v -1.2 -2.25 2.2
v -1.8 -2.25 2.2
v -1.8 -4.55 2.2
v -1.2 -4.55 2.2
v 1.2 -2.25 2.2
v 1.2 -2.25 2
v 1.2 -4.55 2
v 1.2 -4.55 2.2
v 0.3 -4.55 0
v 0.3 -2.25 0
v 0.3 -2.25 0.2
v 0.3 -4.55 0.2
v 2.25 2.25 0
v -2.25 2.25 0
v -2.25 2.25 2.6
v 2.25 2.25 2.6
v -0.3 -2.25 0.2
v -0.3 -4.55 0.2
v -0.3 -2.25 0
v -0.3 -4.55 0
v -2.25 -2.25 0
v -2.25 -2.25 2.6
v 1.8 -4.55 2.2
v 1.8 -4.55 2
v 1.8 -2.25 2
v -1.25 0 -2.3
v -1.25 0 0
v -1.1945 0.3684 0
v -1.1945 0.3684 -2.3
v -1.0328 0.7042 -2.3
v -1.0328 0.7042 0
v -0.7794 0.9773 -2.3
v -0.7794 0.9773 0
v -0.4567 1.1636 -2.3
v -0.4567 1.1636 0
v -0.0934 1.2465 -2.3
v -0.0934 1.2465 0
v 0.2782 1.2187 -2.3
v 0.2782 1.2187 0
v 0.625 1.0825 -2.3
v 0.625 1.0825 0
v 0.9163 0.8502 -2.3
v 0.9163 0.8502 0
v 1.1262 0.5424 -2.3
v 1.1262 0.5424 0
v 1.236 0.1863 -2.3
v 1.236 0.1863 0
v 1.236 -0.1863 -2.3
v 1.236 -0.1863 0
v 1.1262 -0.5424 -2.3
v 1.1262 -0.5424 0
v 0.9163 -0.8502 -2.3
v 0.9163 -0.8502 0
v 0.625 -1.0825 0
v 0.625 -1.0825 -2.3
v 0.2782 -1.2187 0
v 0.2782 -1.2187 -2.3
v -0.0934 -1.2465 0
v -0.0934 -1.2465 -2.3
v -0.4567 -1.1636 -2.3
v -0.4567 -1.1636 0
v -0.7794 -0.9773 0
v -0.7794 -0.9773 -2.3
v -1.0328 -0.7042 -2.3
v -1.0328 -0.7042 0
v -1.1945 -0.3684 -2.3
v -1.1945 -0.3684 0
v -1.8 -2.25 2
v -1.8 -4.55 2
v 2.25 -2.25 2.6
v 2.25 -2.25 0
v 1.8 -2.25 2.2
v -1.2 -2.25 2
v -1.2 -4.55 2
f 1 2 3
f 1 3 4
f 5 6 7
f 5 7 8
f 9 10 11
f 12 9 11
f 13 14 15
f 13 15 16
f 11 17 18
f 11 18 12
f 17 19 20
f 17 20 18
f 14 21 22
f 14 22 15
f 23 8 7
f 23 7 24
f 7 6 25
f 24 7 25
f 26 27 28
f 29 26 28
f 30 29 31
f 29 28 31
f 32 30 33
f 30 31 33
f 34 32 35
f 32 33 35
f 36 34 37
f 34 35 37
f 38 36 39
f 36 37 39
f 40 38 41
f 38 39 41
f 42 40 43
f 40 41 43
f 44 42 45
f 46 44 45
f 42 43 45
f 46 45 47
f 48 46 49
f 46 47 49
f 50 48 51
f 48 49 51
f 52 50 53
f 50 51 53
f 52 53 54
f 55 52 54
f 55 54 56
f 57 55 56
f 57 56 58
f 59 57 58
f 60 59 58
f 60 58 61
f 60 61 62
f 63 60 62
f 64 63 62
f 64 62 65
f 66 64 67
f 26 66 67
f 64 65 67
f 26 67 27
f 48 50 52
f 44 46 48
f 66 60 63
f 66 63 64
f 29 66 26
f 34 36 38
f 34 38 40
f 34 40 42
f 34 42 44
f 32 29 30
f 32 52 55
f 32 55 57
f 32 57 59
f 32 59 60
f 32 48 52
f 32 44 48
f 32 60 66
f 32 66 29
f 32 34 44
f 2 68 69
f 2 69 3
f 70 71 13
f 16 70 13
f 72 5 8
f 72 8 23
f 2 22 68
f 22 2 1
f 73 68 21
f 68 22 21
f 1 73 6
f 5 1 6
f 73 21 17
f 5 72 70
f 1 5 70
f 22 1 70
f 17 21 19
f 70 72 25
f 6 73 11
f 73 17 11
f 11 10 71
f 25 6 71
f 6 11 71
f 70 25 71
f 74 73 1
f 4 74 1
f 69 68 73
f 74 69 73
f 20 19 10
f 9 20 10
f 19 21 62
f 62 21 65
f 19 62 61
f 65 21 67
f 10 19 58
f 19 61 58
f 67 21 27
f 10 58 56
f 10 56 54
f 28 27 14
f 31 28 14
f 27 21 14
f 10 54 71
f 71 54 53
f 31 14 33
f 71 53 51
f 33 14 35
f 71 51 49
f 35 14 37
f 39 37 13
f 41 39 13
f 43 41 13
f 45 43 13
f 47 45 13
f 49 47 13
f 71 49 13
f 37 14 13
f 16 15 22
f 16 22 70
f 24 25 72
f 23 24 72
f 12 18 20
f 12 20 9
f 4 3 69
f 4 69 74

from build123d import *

# Parameters (mm, degrees)
SKETCH_1_W      = 4.5
SKETCH_1_H      = 4.5
EXTRUDE_1_DEPTH = 2.6
SKETCH_3_R      = 1.25
EXTRUDE_2_DEPTH = 2.3
SKETCH_4_W      = 0.6
SKETCH_4_H      = 0.2
EXTRUDE_3_DEPTH = 2.3


with BuildPart() as part:
    # 草图1 → 凸台-拉伸1 (new body)
    with BuildSketch(Plane.XY):
        Rectangle(SKETCH_1_W, SKETCH_1_H)
    extrude(amount=EXTRUDE_1_DEPTH)

    # 草图3 → 凸台-拉伸2 (add)
    with BuildSketch(Plane(origin=(0, 0, 0), x_dir=(-1, 0, 0), z_dir=(0, 0, -1))):
        Circle(SKETCH_3_R)
    extrude(amount=EXTRUDE_2_DEPTH)

    # 草图4 → 凸台-拉伸3 (add)
    with BuildSketch(Plane.XZ.offset(2.25)):
        with Locations((0, 0.1)):
            Rectangle(SKETCH_4_W, SKETCH_4_H)
        with Locations((1.5, 2.1)):
            Rectangle(SKETCH_4_W, SKETCH_4_H)
        with Locations((-1.5, 2.1)):
            Rectangle(SKETCH_4_W, SKETCH_4_H)
    extrude(amount=EXTRUDE_3_DEPTH)


solid = part.part
